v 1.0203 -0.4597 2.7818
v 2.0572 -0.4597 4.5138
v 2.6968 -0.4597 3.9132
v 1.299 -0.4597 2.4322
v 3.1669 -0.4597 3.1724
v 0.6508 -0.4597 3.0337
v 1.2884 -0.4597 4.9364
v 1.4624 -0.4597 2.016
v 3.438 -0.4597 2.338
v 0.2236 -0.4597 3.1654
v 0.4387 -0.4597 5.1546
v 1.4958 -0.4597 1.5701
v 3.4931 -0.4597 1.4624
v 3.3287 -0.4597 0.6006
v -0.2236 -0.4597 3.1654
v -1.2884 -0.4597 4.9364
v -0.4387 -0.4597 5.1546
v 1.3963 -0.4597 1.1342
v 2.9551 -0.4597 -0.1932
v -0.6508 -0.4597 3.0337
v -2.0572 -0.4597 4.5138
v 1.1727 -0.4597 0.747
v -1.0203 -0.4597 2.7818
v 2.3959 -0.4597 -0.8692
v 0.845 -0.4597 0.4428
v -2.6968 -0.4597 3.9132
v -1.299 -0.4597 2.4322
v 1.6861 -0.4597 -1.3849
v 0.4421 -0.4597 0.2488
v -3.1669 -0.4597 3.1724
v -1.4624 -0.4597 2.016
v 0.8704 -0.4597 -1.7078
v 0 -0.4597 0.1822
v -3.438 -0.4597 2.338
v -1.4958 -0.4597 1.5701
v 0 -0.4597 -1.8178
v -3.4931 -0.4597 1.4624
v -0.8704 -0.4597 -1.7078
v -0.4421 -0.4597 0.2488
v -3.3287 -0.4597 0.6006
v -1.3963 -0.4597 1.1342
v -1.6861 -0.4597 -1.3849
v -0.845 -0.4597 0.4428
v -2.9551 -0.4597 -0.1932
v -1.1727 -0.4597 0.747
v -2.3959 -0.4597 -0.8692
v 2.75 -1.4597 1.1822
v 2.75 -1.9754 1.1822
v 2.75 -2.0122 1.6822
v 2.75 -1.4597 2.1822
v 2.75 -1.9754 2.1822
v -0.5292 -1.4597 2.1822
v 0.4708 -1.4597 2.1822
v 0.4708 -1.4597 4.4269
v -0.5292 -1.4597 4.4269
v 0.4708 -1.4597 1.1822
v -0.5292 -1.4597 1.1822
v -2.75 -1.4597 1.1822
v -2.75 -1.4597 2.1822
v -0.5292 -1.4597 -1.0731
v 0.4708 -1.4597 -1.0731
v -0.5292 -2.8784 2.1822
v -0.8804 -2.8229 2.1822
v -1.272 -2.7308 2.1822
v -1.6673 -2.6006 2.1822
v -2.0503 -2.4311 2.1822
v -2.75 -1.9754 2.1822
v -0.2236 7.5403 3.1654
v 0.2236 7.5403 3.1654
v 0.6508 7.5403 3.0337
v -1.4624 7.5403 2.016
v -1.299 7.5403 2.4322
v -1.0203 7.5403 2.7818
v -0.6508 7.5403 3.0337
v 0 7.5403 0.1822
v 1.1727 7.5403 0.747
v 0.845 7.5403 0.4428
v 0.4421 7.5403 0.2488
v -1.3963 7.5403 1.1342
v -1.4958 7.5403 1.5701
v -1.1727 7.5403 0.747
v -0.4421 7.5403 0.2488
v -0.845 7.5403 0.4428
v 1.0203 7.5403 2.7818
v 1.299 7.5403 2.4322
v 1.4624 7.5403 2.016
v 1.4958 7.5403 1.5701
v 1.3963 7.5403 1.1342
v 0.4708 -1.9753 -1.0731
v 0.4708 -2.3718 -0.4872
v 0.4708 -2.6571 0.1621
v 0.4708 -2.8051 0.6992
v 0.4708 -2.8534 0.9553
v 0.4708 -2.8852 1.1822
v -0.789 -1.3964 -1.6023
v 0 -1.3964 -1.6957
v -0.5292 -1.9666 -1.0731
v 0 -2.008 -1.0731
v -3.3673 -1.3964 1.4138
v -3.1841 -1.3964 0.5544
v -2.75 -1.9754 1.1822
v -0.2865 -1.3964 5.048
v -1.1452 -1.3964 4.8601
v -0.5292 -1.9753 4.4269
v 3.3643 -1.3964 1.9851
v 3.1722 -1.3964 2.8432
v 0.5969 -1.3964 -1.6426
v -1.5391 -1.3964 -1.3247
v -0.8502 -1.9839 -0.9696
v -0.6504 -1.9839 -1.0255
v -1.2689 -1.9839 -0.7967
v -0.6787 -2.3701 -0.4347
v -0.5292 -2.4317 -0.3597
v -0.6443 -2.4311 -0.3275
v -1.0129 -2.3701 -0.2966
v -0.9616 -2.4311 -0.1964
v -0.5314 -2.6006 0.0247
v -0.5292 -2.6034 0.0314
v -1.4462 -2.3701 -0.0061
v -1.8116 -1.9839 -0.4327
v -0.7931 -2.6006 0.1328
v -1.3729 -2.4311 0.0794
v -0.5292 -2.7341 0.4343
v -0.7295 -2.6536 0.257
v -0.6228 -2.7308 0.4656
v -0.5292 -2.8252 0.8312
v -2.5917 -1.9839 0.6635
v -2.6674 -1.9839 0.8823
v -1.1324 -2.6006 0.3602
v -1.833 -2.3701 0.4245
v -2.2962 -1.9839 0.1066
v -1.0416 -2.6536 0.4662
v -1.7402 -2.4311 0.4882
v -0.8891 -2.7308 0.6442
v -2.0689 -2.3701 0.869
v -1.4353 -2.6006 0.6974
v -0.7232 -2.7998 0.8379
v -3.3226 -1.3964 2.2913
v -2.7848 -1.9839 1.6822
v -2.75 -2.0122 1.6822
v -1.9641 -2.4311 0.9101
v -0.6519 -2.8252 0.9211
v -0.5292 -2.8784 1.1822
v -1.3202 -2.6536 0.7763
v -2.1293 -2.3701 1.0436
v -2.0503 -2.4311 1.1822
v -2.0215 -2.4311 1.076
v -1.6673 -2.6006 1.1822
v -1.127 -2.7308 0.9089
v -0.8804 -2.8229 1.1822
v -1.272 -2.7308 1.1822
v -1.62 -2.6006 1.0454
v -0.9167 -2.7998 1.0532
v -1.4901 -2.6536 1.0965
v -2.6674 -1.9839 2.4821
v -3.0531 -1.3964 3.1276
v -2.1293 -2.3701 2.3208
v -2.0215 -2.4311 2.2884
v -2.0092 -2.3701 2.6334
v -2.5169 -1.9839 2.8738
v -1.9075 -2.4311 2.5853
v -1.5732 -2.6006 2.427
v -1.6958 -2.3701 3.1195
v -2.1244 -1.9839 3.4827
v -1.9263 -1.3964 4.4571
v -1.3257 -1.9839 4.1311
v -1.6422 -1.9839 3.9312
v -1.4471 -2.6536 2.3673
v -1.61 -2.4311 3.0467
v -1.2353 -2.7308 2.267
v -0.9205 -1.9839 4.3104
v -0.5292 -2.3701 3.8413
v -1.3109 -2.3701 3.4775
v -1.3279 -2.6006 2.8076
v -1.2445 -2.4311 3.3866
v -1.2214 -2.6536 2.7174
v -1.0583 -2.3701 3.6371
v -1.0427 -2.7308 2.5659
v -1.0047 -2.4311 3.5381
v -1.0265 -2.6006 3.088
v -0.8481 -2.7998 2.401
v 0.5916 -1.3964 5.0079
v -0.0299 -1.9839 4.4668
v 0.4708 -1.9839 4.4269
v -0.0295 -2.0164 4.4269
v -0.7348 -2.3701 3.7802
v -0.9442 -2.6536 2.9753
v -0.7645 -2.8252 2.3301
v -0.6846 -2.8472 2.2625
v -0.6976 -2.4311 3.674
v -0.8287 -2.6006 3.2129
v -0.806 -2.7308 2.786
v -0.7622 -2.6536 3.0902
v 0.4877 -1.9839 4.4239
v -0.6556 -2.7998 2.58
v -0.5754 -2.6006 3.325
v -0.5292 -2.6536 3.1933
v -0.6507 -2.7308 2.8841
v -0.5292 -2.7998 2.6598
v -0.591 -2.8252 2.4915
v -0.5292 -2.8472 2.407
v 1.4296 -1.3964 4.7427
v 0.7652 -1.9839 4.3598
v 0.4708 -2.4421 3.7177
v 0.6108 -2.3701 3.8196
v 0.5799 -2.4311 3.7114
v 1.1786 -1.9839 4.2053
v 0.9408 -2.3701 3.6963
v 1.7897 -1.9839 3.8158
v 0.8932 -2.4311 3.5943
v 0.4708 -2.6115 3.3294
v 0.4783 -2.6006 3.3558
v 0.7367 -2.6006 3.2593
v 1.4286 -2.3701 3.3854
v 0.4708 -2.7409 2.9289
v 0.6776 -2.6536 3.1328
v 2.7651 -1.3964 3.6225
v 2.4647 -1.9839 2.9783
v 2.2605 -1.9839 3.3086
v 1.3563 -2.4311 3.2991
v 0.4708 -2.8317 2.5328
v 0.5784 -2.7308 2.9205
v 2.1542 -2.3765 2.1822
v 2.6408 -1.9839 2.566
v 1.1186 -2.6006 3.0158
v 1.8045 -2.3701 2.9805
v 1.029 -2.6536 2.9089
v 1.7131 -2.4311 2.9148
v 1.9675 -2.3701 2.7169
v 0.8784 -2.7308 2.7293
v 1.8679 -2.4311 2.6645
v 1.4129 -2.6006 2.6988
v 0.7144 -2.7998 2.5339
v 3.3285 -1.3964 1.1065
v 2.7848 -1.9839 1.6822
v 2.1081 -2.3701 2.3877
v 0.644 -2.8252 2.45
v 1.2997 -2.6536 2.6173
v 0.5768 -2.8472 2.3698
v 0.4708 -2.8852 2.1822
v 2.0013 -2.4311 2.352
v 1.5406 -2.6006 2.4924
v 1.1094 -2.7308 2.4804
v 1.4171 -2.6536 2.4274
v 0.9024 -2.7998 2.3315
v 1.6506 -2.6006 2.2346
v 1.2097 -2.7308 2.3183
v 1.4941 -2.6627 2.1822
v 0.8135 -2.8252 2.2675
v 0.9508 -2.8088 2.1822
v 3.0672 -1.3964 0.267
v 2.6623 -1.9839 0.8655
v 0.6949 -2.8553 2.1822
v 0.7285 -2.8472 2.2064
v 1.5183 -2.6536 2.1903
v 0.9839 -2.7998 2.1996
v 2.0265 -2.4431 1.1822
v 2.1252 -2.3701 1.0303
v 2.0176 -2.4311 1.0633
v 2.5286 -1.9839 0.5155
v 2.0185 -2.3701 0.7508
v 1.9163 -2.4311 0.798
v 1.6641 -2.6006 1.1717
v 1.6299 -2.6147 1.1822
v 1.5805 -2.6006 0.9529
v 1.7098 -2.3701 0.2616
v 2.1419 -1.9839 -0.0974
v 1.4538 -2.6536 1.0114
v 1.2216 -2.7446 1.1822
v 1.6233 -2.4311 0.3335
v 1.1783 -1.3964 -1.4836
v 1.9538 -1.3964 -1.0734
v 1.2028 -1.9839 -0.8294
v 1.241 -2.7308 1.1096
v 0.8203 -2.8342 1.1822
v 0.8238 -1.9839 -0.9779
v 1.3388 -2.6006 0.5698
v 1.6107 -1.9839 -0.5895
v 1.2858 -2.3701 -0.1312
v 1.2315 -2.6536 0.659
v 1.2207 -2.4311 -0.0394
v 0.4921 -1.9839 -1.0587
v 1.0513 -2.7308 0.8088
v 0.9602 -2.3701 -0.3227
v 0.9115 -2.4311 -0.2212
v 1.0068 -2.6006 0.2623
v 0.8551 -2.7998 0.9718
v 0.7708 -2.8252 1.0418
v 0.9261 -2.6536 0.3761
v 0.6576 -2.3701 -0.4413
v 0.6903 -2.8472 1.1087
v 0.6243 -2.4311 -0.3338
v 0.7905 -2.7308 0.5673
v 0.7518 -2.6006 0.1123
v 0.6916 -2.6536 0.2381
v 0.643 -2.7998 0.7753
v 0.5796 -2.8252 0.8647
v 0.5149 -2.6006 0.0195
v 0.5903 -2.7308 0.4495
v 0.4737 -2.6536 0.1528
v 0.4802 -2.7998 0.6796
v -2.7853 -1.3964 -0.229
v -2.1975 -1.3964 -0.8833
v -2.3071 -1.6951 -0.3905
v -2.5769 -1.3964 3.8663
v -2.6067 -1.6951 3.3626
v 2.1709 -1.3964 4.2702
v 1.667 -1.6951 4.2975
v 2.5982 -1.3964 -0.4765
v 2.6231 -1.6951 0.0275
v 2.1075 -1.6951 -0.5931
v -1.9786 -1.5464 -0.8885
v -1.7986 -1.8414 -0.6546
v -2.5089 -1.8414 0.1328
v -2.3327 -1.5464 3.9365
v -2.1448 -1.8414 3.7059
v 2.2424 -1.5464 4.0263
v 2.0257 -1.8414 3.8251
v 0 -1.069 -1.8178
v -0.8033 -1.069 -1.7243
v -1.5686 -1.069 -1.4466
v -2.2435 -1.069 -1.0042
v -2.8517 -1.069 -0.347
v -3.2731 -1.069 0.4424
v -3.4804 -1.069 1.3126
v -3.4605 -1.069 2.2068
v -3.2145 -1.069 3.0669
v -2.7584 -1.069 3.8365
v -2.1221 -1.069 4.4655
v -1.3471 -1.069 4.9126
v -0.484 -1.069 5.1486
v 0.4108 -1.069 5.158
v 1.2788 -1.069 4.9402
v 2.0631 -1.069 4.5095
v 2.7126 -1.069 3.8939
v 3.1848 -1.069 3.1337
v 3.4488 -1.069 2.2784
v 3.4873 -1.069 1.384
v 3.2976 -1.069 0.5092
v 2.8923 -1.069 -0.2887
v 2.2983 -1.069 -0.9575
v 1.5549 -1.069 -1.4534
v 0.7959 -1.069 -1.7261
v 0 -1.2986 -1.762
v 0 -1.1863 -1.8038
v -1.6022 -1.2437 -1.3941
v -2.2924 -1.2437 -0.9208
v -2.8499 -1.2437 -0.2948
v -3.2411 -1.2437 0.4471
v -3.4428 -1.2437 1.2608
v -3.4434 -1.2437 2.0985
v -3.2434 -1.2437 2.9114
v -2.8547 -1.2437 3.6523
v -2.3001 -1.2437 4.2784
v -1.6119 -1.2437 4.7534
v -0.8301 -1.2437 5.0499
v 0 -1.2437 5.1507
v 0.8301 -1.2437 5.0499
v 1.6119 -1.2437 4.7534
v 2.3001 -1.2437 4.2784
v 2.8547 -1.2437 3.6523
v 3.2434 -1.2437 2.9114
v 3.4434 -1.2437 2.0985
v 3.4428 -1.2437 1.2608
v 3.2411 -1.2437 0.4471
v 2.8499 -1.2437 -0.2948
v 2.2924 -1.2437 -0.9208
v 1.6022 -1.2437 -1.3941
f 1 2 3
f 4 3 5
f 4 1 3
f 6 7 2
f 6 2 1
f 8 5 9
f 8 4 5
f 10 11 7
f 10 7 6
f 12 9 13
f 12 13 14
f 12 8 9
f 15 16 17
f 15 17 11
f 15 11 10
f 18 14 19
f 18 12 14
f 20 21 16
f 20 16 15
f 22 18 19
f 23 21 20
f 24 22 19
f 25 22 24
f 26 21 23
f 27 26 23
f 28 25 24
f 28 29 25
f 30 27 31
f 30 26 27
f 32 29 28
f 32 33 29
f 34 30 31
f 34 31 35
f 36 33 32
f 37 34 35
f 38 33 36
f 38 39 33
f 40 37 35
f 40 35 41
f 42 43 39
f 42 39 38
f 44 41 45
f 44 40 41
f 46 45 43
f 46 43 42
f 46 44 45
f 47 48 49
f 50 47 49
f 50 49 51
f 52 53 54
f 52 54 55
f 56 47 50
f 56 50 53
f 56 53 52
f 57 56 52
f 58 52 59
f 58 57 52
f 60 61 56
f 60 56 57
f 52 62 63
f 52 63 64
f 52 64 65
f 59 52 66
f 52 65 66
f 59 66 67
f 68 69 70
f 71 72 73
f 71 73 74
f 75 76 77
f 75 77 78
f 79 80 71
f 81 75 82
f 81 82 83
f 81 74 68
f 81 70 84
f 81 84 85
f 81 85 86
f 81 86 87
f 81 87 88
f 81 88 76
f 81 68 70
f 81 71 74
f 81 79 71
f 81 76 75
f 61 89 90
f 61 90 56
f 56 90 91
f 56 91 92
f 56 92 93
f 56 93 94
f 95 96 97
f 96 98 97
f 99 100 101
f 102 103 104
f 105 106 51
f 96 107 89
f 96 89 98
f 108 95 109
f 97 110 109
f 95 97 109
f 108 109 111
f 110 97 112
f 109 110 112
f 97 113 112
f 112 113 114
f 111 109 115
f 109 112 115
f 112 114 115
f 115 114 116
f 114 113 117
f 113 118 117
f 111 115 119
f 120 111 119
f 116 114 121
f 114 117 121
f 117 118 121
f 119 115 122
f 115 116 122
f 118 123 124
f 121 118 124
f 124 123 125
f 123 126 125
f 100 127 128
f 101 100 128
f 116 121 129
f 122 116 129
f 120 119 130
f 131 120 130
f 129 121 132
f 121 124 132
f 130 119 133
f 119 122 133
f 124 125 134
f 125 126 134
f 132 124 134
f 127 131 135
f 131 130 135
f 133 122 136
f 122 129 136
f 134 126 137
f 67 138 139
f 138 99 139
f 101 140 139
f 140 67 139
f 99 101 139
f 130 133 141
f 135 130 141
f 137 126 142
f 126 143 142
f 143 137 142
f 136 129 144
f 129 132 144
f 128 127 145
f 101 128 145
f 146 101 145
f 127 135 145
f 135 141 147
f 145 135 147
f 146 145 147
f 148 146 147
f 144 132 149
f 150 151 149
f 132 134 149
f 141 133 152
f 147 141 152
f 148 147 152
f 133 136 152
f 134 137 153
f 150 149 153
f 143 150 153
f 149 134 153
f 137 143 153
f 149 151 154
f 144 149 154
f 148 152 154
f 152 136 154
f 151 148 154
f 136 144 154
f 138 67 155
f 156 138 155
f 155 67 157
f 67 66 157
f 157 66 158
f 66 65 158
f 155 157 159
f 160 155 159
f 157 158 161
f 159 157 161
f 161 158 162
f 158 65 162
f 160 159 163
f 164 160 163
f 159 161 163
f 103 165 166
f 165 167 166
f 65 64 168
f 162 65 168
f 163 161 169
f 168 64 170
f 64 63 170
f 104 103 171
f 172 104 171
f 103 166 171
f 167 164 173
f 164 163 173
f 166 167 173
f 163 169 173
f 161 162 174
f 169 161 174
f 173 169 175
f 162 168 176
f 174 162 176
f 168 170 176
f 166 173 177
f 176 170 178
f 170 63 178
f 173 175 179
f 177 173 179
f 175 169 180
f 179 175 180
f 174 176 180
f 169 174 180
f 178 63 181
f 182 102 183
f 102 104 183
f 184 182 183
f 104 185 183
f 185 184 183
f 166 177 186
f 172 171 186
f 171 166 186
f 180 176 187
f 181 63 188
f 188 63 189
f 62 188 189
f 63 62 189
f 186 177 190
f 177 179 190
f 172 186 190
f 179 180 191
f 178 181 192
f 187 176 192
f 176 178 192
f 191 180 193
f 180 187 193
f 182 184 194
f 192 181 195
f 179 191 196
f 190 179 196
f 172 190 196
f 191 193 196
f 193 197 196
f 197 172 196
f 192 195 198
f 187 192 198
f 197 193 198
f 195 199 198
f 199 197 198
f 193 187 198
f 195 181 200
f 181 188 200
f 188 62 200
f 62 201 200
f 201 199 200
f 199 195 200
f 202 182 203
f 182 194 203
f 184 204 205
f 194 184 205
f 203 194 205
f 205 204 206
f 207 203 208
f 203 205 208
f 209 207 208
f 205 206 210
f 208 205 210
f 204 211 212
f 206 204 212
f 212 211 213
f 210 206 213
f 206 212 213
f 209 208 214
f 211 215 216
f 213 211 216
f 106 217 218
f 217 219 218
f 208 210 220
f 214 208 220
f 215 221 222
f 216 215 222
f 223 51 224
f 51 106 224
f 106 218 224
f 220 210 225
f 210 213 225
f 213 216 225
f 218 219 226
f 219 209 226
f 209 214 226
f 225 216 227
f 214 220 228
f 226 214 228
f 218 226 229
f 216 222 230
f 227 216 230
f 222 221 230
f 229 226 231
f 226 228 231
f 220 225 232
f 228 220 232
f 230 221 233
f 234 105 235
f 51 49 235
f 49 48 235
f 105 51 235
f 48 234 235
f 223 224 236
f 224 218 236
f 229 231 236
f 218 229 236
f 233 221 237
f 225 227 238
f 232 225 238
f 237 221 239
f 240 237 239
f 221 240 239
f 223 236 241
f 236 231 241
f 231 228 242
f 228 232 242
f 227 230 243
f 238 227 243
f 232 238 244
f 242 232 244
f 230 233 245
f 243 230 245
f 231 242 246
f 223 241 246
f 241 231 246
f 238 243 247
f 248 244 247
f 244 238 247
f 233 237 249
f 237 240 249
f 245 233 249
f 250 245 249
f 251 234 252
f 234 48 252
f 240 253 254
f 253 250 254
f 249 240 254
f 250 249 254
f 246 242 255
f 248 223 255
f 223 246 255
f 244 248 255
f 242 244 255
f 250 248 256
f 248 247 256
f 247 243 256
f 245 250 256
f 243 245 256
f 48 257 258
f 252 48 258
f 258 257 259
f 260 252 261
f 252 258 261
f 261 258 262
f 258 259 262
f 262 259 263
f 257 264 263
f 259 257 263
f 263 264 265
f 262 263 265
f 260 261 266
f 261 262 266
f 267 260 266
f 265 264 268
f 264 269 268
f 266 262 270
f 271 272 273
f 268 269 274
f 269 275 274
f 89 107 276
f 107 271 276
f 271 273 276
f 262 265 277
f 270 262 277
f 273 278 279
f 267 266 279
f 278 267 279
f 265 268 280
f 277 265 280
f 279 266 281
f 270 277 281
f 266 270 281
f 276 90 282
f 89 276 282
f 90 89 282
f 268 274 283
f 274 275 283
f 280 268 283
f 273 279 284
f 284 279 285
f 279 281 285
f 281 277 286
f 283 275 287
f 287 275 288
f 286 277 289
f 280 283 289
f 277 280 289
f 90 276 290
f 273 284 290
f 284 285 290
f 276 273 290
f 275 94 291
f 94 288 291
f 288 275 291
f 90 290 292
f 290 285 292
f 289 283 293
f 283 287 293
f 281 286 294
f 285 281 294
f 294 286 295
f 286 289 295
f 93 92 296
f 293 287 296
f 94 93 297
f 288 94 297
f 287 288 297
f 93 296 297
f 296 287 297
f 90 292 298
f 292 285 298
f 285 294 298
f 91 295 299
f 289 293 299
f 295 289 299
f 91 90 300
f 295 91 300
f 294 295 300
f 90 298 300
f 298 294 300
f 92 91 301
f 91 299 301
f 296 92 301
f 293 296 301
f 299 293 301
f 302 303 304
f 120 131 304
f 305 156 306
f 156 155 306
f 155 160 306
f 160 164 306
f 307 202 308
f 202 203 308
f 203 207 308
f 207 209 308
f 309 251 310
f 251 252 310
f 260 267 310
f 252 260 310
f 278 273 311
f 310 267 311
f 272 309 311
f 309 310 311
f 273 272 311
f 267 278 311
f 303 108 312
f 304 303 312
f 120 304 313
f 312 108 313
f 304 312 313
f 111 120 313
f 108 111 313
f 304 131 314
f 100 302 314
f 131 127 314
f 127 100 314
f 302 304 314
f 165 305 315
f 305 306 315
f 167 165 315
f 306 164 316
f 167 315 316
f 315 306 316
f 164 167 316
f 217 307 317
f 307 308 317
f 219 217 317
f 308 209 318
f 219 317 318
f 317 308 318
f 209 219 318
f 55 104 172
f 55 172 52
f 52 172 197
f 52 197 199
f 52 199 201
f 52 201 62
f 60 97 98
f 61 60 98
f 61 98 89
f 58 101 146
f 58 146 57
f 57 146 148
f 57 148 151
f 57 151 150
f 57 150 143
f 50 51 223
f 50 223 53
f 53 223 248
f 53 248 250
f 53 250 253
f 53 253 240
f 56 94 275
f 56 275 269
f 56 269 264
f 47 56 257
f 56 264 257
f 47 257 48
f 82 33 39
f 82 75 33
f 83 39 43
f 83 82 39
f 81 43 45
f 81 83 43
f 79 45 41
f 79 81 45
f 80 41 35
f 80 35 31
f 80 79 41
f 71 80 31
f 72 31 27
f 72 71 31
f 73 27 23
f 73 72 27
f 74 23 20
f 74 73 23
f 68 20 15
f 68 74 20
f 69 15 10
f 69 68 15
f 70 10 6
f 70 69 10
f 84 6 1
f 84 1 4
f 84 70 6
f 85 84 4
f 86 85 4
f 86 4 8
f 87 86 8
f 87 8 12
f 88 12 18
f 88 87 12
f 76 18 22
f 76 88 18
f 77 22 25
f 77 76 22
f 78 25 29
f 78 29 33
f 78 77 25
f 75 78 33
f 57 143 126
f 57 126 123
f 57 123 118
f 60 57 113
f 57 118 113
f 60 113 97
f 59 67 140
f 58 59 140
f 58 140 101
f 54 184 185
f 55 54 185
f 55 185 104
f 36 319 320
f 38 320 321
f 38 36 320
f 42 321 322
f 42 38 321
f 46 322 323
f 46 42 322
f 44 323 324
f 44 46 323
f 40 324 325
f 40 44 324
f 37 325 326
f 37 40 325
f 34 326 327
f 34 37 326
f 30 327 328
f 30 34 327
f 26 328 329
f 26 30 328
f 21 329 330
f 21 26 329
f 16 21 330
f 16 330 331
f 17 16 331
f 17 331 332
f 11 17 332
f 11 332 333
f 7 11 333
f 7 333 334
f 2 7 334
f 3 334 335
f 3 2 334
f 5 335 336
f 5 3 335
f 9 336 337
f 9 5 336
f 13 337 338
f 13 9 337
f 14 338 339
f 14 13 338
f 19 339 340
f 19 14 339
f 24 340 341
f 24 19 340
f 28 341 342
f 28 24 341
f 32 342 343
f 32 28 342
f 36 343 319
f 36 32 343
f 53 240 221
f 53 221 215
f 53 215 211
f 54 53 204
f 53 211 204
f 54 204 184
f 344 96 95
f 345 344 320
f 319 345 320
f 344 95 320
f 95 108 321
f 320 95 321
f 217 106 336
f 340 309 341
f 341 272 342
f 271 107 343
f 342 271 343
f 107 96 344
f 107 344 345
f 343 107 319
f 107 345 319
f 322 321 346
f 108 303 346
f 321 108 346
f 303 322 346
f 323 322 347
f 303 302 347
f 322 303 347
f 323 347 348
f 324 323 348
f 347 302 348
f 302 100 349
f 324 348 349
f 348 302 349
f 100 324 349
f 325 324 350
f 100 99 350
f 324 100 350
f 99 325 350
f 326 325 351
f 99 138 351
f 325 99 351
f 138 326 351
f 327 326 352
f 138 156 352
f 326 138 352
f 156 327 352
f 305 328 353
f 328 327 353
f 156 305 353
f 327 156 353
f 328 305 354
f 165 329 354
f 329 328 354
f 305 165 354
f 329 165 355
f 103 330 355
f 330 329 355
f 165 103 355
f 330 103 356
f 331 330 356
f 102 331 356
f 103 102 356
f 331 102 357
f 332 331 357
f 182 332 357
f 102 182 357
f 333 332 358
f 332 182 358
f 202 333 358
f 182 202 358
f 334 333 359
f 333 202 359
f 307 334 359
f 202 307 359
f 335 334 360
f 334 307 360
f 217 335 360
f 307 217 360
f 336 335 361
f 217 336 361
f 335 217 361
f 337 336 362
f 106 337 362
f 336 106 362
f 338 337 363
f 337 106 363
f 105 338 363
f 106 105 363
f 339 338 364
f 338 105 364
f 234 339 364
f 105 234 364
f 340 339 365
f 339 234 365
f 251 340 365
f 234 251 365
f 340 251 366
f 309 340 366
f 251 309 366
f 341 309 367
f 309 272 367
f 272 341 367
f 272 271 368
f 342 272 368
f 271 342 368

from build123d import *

# Parameters (mm, degrees)
FILLET_1_R          = 0.5
CUT_EXTRUDE_1_DEPTH = 1.5


with BuildPart() as part:
    # 草图2 → 旋转1 (revolve)
    with BuildSketch(Plane(origin=(0, 0, 0), x_dir=(0, 0, -1), z_dir=(1, 0, 0))):
        with BuildLine():
            Line((1.817800027, -0.459726703), (-0.182199973, -0.459726703))
            Line((-0.182199973, -0.459726703), (-0.182199973, 7.540273297))
            Line((-0.182199973, 7.540273297), (-1.682199973, 7.540273297))
            Line((-1.682199973, 7.540273297), (-1.682199973, -0.459726703))
            Line((-1.682199973, -0.459726703), (-1.682199973, -2.959726703))
            add(Edge.make_bspline(
                [(1.817800027, -1.252007585), (1.177768259, -2.02578844), (0.30662425, -2.840564308), (-1.682199973, -2.959726703)],
                knots=[0, 0, 0, 0, 1, 1, 1, 1], degree=3))
            Line((1.817800027, -1.252007585), (1.817800027, -0.459726703))
        make_face()
    revolve(axis=Axis((0, -0.459726703, 1.682199973), (0, 1, 0)))

    # 圆角1
    fillet_1_edges = [part.edges().sort_by_distance(p)[0] for p in [
        (0, -1.252007585, 5.182199973),
    ]]
    fillet(fillet_1_edges, radius=FILLET_1_R)

    # 草图3 → 切除-拉伸1 (cut)
    with BuildSketch(Plane(origin=(0, -2.959726703, 0), x_dir=(-1, 0, 0), z_dir=(0, -1, 0))):
        Polygon((-0.470758808, -1.182199973), (-2.75, -1.182199973), (-2.75, -2.182199973), (-0.470758808, -2.182199973), (-0.470758808, -4.426883393), (0.529241192, -4.426883393), (0.529241192, -2.182199973), (2.75, -2.182199973), (2.75, -1.182199973), (0.529241192, -1.182199973), (0.529241192, 1.073116607), (-0.470758808, 1.073116607), align=None)
    extrude(amount=-CUT_EXTRUDE_1_DEPTH, mode=Mode.SUBTRACT)


solid = part.part
